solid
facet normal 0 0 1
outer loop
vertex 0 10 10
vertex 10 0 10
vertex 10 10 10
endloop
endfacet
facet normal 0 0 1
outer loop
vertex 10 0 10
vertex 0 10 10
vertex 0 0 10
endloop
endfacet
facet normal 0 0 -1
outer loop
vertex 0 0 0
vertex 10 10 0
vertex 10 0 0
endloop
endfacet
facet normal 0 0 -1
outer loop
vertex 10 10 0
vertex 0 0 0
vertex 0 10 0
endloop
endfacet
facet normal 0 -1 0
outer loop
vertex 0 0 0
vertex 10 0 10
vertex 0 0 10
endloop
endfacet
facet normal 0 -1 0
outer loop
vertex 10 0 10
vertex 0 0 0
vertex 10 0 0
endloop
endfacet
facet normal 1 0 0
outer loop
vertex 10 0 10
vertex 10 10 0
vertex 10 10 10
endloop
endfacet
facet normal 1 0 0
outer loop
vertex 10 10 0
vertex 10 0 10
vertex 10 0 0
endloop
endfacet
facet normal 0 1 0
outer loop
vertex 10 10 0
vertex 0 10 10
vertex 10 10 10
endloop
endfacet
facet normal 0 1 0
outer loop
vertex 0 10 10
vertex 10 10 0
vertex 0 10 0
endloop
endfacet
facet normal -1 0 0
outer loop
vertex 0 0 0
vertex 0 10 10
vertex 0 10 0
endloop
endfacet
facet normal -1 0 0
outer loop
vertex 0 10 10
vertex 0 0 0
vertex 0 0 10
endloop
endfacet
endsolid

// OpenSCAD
// Generated by SolidPython 1.1.3 on 2022-12-27 12:07:58


cube(size = 10);
/***********************************************
*********      SolidPython code:      **********
************************************************
 
# This is a sample Python script.

# Press Shift+F10 to execute it or replace it with your code.
# Press Double Shift to search everywhere for classes, files, tool windows, actions, and settings.
from solid import *

def draw_cube():
    c = cube(10)
    scad_render_to_file(c, "./export.scad")

def print_hi(name):
    # Use a breakpoint in the code line below to debug your script.
    print(f'Hi, {name}')  # Press Ctrl+F8 to toggle the breakpoint.


# Press the green button in the gutter to run the script.
if __name__ == '__main__':
    print_hi('PyCharm')

draw_cube()
# See PyCharm help at https://www.jetbrains.com/help/pycharm/
 
 
************************************************/
